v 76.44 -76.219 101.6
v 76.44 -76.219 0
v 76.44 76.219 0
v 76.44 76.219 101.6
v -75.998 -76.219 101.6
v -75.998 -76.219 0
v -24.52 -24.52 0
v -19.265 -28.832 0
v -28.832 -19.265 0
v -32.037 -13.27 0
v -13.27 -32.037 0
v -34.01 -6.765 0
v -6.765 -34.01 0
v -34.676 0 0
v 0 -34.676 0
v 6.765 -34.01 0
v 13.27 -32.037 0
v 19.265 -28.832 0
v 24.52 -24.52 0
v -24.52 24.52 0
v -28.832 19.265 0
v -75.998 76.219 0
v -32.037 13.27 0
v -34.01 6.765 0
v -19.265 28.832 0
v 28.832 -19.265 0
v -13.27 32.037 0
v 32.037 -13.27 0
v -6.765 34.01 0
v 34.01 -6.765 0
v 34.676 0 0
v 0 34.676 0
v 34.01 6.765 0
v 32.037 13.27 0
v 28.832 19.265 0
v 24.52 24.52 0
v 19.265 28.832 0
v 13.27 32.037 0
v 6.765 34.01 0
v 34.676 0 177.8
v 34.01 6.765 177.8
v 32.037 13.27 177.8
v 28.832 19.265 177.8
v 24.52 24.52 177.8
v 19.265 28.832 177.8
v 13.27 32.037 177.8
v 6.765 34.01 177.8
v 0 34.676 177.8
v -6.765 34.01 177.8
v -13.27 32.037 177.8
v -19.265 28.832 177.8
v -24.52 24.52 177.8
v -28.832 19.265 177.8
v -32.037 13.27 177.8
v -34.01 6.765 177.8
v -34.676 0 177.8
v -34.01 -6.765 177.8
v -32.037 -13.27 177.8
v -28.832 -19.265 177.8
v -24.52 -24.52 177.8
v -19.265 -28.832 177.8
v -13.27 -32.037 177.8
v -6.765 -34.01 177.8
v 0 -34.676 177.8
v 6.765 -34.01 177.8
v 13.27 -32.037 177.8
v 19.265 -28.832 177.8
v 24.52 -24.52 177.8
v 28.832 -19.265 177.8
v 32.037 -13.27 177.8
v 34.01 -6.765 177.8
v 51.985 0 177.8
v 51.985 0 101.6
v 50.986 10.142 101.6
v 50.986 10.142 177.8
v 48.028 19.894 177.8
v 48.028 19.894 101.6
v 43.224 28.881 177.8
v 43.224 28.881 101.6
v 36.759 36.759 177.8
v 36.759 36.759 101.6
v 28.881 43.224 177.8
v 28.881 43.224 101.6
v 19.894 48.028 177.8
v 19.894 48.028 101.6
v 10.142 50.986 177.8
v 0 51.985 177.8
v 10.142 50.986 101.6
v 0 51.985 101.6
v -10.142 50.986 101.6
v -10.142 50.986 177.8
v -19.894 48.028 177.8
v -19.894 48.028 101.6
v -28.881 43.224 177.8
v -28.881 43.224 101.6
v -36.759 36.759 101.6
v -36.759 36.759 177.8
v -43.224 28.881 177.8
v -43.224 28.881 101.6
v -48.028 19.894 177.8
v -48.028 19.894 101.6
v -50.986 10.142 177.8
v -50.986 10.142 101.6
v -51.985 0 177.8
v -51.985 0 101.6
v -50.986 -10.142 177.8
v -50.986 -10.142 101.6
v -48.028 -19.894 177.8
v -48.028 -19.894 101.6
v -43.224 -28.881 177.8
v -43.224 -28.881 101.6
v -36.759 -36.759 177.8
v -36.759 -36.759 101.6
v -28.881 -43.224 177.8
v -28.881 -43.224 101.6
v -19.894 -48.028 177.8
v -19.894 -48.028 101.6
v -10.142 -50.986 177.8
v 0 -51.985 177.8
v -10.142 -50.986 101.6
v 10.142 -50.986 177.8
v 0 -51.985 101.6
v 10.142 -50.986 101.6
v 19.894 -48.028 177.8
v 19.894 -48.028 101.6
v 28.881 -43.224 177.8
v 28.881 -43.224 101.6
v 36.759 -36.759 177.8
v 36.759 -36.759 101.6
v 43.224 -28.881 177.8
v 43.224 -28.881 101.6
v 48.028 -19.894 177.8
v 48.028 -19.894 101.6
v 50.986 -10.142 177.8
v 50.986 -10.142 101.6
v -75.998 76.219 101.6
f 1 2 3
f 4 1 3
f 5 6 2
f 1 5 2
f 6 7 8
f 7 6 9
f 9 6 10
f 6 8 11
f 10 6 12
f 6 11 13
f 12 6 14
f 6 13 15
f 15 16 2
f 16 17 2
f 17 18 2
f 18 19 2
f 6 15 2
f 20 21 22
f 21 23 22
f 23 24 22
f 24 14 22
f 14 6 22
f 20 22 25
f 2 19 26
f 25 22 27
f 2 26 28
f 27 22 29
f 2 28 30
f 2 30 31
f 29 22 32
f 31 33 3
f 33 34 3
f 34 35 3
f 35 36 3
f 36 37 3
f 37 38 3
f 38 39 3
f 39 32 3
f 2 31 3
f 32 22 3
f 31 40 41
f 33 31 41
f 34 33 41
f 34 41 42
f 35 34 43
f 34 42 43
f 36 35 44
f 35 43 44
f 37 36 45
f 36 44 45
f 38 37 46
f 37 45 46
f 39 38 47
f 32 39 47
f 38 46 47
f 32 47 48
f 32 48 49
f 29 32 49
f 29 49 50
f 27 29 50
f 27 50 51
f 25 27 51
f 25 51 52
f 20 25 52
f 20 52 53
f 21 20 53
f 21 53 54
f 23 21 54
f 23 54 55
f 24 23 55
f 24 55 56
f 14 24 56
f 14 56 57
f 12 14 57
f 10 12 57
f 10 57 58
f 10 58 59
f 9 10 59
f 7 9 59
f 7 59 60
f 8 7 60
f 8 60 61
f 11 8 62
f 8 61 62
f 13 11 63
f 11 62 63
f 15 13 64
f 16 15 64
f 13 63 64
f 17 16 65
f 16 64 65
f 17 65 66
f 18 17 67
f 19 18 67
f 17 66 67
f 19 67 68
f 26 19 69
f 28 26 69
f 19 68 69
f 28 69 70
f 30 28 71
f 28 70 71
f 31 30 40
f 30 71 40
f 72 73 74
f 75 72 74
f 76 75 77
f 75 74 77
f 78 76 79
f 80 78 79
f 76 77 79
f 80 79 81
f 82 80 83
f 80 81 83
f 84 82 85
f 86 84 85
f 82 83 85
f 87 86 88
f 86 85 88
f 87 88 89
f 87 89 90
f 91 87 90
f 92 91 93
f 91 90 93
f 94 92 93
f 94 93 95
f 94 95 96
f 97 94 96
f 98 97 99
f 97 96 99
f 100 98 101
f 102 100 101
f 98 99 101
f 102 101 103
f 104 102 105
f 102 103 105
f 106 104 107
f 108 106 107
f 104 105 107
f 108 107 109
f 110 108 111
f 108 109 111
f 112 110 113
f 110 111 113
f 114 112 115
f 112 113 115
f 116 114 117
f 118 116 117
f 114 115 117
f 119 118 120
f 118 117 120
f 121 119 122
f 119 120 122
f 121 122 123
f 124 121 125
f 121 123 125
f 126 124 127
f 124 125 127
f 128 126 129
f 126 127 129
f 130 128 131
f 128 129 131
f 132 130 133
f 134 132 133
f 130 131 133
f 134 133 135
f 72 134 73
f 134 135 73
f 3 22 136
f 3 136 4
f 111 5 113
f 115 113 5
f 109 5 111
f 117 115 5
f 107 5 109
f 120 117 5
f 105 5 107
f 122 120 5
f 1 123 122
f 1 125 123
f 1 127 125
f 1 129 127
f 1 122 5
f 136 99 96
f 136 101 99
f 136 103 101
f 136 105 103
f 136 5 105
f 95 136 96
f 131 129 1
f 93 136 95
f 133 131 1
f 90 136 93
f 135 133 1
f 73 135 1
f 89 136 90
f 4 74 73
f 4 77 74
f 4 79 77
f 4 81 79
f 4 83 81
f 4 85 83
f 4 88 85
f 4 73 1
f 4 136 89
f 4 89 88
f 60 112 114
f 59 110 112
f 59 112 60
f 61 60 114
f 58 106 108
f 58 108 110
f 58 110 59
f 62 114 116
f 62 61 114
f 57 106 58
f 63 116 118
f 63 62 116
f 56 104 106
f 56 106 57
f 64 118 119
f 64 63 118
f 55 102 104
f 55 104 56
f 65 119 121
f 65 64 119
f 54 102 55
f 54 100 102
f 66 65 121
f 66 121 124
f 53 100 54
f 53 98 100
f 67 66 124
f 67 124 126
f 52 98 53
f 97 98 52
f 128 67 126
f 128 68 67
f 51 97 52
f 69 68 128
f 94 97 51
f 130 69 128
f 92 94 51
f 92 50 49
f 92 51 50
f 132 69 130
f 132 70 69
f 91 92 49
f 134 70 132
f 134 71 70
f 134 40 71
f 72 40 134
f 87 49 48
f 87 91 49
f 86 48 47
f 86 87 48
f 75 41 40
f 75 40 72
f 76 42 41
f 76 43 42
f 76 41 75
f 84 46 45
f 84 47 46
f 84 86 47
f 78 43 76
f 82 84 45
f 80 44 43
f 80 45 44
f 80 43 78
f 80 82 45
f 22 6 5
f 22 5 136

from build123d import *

# Parameters (mm, degrees)
F0_W     = 152.437769
F0_H     = 152.437777
F1_DEPTH = 101.6
F2_R     = 51.98485
F3_DEPTH = 76.2
F4_R     = 34.676264
F5_DEPTH = 177.801


with BuildPart() as f1:
    # F0 (on Top) → F1 (new body)
    with BuildSketch(Plane.XY):
        with Locations((0.220928, -8e-06)):
            Rectangle(F0_W, F0_H)
    extrude(amount=F1_DEPTH)

    # F2 (on face) → F3 (join)
    with BuildSketch(Plane.XY.offset(101.6)):
        Circle(F2_R)
    extrude(amount=F3_DEPTH)

    # F4 (on face) → F5 (cut, through all)
    with BuildSketch(Plane.XY.offset(177.8)):
        Circle(F4_R)
    extrude(amount=-F5_DEPTH, mode=Mode.SUBTRACT)


solid = f1.part
